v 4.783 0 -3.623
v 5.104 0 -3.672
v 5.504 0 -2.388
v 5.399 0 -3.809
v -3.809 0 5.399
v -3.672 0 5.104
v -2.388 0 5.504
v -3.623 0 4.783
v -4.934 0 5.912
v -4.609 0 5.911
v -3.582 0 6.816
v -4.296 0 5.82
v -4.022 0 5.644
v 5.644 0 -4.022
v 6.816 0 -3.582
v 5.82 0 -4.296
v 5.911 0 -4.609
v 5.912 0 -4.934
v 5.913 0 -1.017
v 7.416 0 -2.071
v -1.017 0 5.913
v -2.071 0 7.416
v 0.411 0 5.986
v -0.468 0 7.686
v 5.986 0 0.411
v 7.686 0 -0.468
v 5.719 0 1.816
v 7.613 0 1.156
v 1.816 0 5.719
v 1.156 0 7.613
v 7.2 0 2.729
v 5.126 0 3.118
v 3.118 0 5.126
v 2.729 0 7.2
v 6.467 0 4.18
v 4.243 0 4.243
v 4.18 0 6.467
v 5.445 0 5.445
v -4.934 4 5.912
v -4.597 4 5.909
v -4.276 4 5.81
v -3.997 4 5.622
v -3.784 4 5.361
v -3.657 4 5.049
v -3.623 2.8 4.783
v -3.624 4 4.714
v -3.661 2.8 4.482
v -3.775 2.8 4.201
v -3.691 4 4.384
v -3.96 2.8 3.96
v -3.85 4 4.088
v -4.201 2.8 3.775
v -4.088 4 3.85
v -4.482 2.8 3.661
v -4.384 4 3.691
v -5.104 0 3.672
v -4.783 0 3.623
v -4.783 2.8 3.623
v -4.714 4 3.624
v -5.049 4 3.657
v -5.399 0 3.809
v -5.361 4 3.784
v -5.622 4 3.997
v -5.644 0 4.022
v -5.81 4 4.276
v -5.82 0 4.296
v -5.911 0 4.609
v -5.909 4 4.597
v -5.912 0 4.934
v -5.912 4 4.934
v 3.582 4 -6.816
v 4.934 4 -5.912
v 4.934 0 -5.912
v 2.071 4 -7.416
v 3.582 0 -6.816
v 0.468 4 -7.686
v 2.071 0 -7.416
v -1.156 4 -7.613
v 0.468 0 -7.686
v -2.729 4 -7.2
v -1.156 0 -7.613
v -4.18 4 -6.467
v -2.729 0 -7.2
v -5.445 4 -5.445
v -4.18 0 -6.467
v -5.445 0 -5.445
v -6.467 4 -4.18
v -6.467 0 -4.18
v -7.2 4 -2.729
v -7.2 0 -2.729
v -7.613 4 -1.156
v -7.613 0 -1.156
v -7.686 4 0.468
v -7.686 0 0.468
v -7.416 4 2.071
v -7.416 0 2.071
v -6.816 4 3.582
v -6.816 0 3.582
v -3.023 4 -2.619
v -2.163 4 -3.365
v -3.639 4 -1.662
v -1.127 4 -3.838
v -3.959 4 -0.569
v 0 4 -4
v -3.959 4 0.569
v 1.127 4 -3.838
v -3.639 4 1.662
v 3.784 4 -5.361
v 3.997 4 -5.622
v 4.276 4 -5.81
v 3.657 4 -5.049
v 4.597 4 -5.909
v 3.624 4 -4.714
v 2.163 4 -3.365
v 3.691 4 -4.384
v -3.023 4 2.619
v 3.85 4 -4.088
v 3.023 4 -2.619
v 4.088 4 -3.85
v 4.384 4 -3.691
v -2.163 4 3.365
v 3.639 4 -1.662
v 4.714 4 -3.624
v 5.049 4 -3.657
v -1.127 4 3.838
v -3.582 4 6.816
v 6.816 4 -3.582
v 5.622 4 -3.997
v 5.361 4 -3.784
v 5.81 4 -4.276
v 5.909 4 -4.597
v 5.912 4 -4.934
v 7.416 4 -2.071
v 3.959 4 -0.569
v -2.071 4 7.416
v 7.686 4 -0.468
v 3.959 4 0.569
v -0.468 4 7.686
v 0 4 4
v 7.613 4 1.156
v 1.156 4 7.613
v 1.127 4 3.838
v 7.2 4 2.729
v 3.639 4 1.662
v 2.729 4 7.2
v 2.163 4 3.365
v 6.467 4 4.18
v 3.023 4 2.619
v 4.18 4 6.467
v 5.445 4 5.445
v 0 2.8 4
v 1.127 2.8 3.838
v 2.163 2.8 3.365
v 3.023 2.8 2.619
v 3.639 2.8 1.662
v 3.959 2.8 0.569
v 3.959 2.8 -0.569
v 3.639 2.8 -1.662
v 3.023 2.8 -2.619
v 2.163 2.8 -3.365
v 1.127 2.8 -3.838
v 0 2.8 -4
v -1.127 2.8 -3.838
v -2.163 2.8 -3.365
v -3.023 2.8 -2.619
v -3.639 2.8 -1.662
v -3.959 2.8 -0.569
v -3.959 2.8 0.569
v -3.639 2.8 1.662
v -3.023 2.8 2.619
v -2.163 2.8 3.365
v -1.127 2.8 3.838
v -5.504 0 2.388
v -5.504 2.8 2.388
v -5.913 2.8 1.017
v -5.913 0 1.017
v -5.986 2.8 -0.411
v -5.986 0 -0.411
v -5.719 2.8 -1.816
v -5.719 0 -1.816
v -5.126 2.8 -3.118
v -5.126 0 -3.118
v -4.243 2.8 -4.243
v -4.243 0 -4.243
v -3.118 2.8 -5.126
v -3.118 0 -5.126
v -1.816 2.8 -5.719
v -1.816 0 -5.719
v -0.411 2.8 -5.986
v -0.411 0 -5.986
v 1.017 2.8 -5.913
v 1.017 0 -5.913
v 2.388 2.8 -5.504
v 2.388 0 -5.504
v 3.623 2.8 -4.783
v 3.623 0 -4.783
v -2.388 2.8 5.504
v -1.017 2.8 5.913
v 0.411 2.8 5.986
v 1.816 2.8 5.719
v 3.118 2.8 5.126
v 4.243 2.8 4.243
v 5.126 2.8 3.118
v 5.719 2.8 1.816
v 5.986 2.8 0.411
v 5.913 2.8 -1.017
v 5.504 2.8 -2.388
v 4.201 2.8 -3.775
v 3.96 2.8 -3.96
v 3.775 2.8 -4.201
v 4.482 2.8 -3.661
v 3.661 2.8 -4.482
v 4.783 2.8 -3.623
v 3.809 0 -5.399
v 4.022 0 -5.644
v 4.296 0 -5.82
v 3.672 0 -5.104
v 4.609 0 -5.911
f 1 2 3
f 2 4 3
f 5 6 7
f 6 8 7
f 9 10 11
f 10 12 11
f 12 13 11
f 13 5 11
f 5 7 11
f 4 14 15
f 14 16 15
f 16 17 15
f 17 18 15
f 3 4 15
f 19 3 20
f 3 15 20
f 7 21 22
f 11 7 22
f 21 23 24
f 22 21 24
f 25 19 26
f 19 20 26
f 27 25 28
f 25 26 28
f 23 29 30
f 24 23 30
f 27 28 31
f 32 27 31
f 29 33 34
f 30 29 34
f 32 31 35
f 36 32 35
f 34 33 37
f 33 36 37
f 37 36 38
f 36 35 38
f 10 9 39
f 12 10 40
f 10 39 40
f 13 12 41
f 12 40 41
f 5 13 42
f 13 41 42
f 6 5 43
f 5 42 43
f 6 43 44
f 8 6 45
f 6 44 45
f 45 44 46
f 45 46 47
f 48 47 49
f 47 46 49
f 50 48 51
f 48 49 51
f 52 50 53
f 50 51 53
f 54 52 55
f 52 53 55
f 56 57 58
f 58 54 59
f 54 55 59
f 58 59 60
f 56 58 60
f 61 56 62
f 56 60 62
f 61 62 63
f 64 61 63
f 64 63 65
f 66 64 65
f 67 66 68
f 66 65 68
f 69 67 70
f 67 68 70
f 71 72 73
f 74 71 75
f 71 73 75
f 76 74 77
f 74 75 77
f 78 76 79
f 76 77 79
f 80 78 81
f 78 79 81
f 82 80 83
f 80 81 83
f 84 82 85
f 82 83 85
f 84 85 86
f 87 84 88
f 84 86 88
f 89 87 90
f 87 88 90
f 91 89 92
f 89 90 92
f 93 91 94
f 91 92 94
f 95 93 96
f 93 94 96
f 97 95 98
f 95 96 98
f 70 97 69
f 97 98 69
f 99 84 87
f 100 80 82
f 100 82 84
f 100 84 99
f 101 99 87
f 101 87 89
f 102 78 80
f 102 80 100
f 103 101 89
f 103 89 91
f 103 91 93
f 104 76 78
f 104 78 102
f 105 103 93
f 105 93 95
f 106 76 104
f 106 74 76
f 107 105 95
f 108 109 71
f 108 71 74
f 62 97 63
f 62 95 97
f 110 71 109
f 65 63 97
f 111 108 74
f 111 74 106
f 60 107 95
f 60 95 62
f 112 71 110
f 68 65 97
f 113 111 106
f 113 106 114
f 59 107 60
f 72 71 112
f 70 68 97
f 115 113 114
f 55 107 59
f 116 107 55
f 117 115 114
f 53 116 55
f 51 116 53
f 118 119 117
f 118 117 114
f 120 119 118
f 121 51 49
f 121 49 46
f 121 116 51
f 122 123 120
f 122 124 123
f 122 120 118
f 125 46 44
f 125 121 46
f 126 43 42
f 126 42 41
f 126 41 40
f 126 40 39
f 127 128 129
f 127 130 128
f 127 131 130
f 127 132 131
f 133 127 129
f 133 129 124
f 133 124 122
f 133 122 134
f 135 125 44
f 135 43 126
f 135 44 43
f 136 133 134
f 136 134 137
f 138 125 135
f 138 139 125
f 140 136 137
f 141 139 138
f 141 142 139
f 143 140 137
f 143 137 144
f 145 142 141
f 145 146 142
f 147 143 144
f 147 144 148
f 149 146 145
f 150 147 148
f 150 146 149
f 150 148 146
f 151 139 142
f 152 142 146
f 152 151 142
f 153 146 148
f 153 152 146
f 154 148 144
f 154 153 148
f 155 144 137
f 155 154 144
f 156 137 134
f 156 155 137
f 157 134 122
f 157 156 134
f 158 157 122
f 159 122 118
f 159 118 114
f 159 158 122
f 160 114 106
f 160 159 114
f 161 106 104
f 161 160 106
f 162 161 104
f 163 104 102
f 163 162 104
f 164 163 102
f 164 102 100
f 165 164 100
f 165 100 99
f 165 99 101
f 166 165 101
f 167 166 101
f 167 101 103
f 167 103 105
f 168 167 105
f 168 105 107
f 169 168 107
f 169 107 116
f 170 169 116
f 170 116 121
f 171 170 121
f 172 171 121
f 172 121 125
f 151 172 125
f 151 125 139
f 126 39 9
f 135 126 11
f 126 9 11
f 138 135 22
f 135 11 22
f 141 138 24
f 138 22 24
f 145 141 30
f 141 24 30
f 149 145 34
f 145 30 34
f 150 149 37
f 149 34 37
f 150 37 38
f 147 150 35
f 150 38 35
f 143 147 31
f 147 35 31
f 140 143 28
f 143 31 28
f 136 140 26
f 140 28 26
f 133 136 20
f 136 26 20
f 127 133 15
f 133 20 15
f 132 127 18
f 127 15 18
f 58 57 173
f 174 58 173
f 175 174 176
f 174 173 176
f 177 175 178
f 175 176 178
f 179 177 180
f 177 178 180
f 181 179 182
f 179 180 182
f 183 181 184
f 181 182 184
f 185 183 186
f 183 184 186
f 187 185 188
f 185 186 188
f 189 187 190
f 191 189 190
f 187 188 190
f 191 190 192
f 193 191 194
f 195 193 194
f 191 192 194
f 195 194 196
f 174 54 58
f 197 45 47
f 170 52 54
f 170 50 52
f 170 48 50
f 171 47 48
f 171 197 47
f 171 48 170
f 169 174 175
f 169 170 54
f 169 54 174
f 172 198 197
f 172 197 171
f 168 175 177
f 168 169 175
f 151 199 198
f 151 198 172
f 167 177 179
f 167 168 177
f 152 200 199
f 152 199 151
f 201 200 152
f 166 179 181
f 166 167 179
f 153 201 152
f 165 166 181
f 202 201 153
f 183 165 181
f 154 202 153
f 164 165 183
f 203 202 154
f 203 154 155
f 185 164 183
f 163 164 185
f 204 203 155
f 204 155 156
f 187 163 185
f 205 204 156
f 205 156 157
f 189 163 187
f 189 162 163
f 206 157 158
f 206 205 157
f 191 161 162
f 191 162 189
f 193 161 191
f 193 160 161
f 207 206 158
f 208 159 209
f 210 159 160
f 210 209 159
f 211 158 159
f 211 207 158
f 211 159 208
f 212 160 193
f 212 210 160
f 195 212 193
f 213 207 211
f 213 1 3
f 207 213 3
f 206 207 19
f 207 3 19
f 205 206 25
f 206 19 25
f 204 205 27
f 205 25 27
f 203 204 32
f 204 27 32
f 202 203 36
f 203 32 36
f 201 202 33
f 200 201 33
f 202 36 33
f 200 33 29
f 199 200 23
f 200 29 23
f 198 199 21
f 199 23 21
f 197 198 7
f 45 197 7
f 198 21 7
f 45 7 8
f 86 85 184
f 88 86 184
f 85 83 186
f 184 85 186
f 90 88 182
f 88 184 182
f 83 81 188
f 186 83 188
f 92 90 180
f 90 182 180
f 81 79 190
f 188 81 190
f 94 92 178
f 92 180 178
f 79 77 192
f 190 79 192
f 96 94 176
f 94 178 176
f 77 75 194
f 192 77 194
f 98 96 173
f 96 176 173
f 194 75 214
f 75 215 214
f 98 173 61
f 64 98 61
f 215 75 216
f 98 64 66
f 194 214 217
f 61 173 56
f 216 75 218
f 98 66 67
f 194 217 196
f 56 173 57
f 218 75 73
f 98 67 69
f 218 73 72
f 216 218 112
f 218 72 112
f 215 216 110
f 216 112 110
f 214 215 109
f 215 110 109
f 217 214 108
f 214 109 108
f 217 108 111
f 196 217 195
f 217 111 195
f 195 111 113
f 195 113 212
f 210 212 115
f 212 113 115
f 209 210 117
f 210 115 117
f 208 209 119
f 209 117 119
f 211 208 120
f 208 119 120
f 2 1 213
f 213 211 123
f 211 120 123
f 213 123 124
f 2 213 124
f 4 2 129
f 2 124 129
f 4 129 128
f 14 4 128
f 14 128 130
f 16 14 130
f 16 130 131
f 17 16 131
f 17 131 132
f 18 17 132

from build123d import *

# Parameters (mm, degrees)
SKETCH1_R           = 7.7
SKETCH1_R_2         = 4
BOSS_EXTRUDE1_DEPTH = 4
SKETCH2_R           = 6
CUT_EXTRUDE1_DEPTH  = 2.8
SKETCH3_R           = 1.15
CUT_EXTRUDE2_DEPTH  = 12.600862037


with BuildPart() as part:
    # Sketch1 → Boss-Extrude1 (new body)
    with BuildSketch(Plane(origin=(0, 0, 0), x_dir=(1, 0, 0), z_dir=(0, 1, 0))):
        with Locations(Location((0, 0, 0), (0, 0, 270))):
            Circle(SKETCH1_R)
        with Locations(Location((0, 0, 0), (0, 0, 270))):
            Circle(SKETCH1_R_2, mode=Mode.SUBTRACT)
    extrude(amount=BOSS_EXTRUDE1_DEPTH)

    # Sketch2 → Cut-Extrude1 (cut)
    with BuildSketch(Plane.XZ):
        with Locations(Location((0, 0, 0), (0, 0, 270))):
            Circle(SKETCH2_R)
    extrude(amount=-CUT_EXTRUDE1_DEPTH, mode=Mode.SUBTRACT)

    # Sketch3 → Cut-Extrude2 (cut, through all)
    with BuildSketch(Plane(origin=(0, 4, 0), x_dir=(1, 0, 0), z_dir=(0, 1, 0))):
        with Locations((4.772970773, 4.772970773)):
            Circle(SKETCH3_R)
        with Locations((-4.772970773, -4.772970773)):
            Circle(SKETCH3_R)
    extrude(amount=-CUT_EXTRUDE2_DEPTH, mode=Mode.SUBTRACT)


solid = part.part
